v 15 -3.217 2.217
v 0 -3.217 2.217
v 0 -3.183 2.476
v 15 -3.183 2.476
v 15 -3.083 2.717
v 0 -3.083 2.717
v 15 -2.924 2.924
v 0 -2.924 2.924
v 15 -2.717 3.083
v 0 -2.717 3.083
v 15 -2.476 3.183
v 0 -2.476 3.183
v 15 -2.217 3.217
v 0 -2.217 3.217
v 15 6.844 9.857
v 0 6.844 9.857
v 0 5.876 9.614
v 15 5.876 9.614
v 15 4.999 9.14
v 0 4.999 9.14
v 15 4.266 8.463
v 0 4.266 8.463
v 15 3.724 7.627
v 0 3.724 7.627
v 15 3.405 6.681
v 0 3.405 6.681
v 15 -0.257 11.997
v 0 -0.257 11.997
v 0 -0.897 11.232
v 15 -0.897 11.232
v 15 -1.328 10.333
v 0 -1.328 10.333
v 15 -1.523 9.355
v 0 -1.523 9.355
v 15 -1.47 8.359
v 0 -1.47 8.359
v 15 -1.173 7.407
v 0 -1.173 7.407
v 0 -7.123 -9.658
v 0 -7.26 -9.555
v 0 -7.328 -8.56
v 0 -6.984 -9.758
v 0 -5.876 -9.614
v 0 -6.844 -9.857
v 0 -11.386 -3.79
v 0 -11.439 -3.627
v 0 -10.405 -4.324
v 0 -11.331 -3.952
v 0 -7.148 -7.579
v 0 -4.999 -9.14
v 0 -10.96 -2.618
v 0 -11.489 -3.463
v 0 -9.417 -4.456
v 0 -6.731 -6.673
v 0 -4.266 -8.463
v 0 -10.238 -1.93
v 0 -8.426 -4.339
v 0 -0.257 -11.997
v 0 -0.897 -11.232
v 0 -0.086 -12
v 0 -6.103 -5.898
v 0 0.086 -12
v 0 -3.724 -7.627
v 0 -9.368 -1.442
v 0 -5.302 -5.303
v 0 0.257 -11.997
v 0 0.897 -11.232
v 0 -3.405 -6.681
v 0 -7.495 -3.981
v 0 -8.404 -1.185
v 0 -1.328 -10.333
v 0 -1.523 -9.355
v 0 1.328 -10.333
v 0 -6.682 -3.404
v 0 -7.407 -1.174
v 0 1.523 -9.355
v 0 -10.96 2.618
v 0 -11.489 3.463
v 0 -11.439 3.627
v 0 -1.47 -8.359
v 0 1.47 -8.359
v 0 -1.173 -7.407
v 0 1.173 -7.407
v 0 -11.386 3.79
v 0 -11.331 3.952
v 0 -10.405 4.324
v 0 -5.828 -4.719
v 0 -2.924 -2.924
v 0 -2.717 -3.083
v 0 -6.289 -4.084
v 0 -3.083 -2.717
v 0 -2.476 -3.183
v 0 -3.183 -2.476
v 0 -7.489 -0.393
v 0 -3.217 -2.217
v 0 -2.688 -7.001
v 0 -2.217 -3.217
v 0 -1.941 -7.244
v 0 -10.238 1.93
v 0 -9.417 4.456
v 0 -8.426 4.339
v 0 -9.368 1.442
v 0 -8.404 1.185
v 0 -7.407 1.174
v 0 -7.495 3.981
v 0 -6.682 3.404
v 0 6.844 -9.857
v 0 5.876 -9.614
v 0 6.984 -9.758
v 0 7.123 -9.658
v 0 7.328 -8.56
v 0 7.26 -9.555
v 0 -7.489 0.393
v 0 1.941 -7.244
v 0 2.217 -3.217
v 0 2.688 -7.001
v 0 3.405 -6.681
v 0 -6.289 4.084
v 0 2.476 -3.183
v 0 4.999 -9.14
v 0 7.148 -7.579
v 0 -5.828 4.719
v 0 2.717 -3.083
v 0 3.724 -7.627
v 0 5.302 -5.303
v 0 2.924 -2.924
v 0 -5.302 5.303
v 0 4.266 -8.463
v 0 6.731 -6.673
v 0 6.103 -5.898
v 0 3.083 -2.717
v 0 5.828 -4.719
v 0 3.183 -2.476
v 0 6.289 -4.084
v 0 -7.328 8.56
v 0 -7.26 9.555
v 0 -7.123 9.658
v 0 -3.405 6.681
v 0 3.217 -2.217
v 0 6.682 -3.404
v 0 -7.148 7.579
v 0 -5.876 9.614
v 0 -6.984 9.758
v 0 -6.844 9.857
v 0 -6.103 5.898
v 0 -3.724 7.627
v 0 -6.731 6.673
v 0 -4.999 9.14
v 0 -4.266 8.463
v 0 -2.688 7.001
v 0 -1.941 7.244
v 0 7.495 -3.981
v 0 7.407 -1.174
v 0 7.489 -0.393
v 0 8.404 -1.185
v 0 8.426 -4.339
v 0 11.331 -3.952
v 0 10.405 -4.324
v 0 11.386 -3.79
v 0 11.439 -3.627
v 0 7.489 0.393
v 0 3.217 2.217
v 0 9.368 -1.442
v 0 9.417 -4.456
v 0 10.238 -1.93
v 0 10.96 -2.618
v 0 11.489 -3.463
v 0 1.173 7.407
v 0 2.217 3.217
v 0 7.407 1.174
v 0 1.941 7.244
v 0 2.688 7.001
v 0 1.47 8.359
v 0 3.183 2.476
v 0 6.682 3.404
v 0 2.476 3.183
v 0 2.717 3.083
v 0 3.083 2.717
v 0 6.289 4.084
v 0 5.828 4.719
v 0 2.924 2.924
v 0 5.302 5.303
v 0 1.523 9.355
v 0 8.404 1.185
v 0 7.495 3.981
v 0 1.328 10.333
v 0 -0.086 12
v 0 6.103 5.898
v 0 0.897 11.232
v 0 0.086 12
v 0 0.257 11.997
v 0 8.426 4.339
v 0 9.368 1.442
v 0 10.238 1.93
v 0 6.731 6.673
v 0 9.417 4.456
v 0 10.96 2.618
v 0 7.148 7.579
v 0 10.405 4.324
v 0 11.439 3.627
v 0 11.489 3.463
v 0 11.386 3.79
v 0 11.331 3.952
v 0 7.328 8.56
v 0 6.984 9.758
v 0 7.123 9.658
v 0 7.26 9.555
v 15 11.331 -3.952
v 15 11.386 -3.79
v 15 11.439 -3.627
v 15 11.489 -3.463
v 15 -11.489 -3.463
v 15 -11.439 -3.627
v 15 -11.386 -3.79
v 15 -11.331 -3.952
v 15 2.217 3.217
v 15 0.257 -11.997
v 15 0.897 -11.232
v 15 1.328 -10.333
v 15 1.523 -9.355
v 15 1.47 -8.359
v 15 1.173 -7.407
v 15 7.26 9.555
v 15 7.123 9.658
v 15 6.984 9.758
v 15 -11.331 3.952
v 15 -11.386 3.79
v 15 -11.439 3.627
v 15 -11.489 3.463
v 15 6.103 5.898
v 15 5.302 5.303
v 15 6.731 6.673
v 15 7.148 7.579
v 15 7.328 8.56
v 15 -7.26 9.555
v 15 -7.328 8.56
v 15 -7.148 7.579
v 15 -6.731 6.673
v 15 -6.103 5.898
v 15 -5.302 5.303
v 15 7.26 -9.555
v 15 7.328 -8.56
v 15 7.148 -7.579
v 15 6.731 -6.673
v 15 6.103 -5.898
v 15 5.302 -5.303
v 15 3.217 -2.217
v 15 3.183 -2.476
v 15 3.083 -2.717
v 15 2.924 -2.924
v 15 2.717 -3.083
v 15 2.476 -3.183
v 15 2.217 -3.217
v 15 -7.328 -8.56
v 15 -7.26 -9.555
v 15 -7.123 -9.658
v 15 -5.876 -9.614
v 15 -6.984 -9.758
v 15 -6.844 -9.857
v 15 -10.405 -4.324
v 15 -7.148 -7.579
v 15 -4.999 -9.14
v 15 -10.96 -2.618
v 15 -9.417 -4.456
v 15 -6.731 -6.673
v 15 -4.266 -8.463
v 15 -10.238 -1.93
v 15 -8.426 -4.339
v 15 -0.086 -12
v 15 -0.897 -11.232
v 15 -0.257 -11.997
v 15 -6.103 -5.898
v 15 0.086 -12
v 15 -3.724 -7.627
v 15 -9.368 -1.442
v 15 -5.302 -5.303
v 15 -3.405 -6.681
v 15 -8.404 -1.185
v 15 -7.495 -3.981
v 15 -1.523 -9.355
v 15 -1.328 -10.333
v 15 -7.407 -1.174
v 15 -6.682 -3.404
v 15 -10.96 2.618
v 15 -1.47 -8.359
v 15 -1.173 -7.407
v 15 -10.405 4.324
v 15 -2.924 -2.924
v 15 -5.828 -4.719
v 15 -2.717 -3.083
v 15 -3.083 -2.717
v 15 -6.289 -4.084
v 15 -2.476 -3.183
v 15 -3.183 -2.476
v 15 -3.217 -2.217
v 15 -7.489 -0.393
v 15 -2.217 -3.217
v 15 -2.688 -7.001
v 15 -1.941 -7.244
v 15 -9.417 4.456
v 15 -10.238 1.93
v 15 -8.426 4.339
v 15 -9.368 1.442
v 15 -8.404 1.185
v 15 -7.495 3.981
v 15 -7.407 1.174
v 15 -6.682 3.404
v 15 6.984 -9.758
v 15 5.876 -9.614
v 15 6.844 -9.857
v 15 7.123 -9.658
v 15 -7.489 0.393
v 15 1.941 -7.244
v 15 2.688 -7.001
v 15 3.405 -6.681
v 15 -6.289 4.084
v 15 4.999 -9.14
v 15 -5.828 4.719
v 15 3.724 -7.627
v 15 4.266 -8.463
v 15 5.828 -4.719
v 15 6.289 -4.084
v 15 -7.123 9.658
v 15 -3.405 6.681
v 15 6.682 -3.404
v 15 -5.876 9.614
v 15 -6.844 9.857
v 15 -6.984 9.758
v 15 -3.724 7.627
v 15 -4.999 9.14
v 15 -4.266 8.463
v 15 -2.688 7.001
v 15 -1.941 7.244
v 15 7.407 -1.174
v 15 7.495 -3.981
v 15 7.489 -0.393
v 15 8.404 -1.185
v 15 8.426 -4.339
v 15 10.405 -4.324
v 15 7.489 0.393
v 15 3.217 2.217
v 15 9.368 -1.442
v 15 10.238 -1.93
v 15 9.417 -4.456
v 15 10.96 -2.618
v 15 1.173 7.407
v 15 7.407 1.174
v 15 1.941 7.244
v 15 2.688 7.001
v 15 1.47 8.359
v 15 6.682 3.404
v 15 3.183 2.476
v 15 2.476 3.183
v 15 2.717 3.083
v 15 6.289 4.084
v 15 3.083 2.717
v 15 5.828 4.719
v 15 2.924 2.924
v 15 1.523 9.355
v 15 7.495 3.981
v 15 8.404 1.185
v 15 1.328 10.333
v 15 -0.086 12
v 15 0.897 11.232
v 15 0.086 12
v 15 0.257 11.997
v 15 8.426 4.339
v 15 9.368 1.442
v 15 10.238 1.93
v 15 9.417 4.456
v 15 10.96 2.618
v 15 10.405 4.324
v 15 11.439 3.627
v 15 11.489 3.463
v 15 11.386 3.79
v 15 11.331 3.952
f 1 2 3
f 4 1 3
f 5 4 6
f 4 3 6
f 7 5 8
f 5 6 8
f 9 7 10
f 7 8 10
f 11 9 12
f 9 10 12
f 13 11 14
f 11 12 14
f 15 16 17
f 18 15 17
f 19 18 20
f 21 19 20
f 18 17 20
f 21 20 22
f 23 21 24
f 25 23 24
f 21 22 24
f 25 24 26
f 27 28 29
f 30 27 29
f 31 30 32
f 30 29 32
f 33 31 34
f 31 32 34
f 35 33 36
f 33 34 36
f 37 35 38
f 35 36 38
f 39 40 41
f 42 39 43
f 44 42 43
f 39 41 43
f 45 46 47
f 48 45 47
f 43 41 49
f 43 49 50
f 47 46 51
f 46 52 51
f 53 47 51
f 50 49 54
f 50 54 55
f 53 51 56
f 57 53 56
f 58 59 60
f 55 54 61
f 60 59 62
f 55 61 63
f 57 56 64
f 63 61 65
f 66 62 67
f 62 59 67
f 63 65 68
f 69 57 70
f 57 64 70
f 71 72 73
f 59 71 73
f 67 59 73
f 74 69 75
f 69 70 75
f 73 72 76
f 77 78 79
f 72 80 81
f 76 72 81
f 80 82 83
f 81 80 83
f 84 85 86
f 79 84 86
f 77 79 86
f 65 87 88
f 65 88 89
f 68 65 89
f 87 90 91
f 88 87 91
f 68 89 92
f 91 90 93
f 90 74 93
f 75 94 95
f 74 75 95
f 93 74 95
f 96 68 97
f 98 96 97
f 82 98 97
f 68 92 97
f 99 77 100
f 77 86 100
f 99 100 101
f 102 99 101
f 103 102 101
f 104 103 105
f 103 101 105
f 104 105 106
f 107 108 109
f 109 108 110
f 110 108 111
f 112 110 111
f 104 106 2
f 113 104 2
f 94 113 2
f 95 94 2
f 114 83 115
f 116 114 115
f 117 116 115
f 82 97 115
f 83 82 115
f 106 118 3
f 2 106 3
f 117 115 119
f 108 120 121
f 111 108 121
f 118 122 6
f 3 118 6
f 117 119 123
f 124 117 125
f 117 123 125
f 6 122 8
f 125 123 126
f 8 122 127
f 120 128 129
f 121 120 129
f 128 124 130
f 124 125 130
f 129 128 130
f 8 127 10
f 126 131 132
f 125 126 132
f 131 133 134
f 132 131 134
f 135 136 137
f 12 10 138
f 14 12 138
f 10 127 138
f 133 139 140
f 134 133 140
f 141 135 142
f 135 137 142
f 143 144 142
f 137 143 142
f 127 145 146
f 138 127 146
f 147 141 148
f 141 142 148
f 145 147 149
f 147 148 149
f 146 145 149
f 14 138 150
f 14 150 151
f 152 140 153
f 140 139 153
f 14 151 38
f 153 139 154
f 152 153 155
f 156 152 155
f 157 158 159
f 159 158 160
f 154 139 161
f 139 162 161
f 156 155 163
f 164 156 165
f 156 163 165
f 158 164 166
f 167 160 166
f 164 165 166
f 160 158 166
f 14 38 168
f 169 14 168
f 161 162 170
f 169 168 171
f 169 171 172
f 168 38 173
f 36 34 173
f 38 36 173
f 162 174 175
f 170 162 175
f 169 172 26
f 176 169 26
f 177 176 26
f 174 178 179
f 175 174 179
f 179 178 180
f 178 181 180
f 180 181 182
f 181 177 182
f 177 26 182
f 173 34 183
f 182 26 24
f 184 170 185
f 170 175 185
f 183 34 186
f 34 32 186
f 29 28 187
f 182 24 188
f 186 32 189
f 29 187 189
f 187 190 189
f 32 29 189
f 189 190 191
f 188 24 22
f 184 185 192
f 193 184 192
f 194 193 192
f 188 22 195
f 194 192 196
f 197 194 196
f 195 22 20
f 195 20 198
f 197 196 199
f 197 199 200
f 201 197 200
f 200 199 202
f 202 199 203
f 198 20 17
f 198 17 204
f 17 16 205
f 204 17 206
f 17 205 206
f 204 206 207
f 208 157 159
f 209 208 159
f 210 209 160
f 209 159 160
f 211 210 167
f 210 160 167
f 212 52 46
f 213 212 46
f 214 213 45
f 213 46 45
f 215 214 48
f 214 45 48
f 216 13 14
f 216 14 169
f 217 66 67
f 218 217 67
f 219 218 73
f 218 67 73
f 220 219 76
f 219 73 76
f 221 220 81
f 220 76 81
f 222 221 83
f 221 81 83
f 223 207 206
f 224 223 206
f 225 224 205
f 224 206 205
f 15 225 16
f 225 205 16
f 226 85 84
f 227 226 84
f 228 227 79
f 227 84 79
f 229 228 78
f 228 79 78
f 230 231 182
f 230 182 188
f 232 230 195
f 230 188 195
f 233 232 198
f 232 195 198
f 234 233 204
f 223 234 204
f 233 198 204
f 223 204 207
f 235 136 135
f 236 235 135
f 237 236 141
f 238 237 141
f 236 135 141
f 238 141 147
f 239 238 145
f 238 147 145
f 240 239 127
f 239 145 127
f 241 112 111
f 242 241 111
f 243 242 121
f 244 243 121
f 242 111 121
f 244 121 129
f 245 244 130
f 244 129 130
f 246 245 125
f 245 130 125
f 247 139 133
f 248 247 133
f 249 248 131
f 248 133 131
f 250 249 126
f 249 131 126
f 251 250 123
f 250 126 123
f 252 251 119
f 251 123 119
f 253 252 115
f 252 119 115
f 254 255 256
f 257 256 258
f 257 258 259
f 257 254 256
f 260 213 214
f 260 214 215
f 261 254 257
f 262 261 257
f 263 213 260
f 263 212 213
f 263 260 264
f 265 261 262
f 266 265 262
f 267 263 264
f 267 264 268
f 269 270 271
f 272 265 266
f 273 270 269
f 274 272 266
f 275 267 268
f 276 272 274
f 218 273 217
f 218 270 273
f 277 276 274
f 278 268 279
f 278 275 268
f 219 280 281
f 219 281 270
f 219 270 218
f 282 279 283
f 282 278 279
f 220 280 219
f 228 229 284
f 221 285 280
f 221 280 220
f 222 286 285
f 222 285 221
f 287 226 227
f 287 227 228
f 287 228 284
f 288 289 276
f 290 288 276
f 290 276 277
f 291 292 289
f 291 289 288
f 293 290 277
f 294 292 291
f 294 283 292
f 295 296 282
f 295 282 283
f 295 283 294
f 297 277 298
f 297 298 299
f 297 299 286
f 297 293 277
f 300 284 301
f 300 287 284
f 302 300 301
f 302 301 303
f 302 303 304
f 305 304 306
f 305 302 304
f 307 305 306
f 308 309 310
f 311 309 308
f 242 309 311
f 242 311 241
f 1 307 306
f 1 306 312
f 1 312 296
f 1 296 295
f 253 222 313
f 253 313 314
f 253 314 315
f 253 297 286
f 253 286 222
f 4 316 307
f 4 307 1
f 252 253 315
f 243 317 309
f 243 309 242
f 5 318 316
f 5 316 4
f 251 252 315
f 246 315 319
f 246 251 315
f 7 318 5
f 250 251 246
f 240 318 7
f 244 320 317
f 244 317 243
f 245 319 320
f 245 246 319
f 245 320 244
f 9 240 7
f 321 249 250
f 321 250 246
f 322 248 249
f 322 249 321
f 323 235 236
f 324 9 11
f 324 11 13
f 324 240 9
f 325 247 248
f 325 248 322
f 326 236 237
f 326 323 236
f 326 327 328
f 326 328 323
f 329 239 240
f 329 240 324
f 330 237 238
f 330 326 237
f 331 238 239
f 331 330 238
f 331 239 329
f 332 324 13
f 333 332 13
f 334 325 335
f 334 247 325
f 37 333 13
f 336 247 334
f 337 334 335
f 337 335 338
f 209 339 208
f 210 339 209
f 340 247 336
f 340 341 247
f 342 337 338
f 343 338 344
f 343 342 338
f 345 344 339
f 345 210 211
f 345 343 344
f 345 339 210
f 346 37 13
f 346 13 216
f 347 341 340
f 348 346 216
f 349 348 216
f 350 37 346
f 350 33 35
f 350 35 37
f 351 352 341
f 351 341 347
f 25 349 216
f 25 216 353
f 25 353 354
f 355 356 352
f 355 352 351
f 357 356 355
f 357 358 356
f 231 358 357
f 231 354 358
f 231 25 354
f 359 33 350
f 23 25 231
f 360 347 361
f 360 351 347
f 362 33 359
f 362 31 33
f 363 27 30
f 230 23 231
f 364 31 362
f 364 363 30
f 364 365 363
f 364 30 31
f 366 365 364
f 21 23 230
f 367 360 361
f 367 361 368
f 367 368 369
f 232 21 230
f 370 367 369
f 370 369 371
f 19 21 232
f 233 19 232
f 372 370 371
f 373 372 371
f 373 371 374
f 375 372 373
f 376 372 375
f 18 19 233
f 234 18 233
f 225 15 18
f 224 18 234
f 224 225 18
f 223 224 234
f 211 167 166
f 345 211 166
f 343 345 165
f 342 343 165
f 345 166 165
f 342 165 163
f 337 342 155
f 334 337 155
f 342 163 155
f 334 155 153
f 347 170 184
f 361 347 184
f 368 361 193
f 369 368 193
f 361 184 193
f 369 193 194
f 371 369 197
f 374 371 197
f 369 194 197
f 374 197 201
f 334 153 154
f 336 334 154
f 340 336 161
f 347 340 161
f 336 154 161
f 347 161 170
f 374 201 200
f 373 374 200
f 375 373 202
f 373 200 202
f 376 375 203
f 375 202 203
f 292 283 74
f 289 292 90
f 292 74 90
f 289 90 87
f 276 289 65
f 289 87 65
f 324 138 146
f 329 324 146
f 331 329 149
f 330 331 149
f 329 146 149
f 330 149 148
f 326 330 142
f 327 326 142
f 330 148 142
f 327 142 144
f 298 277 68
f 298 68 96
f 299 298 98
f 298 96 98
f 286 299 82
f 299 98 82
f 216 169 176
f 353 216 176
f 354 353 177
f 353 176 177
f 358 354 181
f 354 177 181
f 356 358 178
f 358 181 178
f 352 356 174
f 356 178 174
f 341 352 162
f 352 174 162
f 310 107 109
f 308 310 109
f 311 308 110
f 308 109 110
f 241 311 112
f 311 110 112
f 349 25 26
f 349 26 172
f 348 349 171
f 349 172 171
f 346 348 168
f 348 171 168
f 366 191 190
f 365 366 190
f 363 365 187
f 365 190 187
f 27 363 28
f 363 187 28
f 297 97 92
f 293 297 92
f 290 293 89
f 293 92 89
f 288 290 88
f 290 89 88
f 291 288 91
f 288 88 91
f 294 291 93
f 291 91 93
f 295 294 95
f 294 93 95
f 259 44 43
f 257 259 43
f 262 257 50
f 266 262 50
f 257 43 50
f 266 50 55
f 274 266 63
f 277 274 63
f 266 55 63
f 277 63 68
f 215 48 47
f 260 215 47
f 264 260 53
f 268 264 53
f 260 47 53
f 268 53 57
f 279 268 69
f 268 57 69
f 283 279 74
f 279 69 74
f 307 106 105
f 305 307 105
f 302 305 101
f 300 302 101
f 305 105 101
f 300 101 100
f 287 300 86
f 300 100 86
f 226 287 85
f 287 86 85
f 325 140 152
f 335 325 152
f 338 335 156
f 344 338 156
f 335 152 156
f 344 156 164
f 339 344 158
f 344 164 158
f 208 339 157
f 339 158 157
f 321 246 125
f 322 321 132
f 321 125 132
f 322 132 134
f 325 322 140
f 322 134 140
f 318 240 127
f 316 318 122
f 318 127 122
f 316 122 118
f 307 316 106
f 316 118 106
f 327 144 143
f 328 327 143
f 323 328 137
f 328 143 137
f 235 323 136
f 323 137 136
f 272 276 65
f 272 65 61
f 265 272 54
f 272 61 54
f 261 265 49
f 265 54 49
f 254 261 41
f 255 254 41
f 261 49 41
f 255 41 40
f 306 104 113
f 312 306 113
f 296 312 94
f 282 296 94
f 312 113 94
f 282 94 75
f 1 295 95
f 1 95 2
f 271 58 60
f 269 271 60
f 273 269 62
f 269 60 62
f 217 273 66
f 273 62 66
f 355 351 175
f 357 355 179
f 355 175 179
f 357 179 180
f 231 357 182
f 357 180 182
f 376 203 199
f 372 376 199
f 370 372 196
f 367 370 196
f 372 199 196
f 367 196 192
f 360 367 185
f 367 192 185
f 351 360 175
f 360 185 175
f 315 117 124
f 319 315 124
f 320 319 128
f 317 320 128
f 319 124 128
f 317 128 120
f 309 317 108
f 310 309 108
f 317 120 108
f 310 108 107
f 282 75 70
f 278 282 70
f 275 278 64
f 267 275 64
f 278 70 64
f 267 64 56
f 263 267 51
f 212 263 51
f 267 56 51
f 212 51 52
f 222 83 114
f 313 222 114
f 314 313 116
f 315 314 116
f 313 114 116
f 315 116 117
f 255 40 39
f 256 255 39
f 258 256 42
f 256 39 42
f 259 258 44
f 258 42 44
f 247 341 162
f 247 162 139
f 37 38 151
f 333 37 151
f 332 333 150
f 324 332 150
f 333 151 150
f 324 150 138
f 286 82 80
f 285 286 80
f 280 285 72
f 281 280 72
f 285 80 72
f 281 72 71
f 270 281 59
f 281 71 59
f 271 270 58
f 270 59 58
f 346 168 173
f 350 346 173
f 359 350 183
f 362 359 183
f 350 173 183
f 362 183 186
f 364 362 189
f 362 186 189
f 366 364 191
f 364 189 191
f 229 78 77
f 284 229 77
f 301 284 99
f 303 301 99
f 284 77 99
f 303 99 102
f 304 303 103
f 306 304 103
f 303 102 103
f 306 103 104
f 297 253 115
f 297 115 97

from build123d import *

# Parameters (mm, degrees)
SPUR_GEAR_GB_BORE_OUTLINE_R = 1
SPUR_GEAR_GB_BORE_DEPTH     = 15
CUT_EXTRUDE_3_DEPTH         = 15


# Read off the part's stored shape, not the designer's step: <spur gear_gb>-<Bore>
with BuildPart() as part:
    # <spur gear_gb>-<Bore> outline → <spur gear_gb>-<Bore> (new body)
    with BuildSketch(Plane.YZ):
        with BuildLine():
            ThreePointArc((-0.256880001, -11.997250213), (0, -12), (0.256880001, -11.997250213))
            ThreePointArc((0.256880001, -11.997250213), (1.456299749, -9.849931218), (1.172541409, -7.406763642))
            ThreePointArc((1.172541409, -7.406763642), (2.317318441, -7.131972816), (3.404980509, -6.681400207))
            ThreePointArc((3.404980509, -6.681400207), (4.61147306, -8.824753264), (6.843986457, -9.856969584))
            ThreePointArc((6.843986457, -9.856969584), (7.053423027, -9.708203933), (7.259627029, -9.554989032))
            ThreePointArc((7.259627029, -9.554989032), (6.967815552, -7.112770233), (5.302192362, -5.302995112))
            ThreePointArc((5.302192362, -5.302995112), (6.066818441, -4.407801607), (6.681915604, -3.403968986))
            ThreePointArc((6.681915604, -3.403968986), (8.917819898, -4.428819506), (11.330682707, -3.9516616))
            ThreePointArc((11.330682707, -3.9516616), (11.412678196, -3.708203933), (11.489443278, -3.463046803))
            ThreePointArc((11.489443278, -3.463046803), (9.817862641, -1.658772773), (7.406586048, -1.173662691))
            ThreePointArc((7.406586048, -1.173662691), (7.499, 0), (7.406586048, 1.173662691))
            ThreePointArc((7.406586048, 1.173662691), (9.817862641, 1.658772773), (11.489443278, 3.463046803))
            ThreePointArc((11.489443278, 3.463046803), (11.412678196, 3.708203933), (11.330682707, 3.9516616))
            ThreePointArc((11.330682707, 3.9516616), (8.917819898, 4.428819506), (6.681915604, 3.403968986))
            ThreePointArc((6.681915604, 3.403968986), (6.066818441, 4.407801607), (5.302192362, 5.302995112))
            ThreePointArc((5.302192362, 5.302995112), (6.967815552, 7.112770233), (7.259627029, 9.554989032))
            ThreePointArc((7.259627029, 9.554989032), (7.053423027, 9.708203933), (6.843986457, 9.856969584))
            ThreePointArc((6.843986457, 9.856969584), (4.61147306, 8.824753264), (3.404980509, 6.681400207))
            ThreePointArc((3.404980509, 6.681400207), (2.317318441, 7.131972816), (1.172541409, 7.406763642))
            ThreePointArc((1.172541409, 7.406763642), (1.456299749, 9.849931218), (0.256880001, 11.997250213))
            ThreePointArc((0.256880001, 11.997250213), (0, 12), (-0.256880001, 11.997250213))
            ThreePointArc((-0.256880001, 11.997250213), (-1.456299749, 9.849931218), (-1.172541409, 7.406763642))
            ThreePointArc((-1.172541409, 7.406763642), (-2.317318441, 7.131972816), (-3.404980509, 6.681400207))
            ThreePointArc((-3.404980509, 6.681400207), (-4.61147306, 8.824753264), (-6.843986457, 9.856969584))
            ThreePointArc((-6.843986457, 9.856969584), (-7.053423027, 9.708203933), (-7.259627029, 9.554989032))
            ThreePointArc((-7.259627029, 9.554989032), (-6.967815552, 7.112770233), (-5.302192362, 5.302995112))
            ThreePointArc((-5.302192362, 5.302995112), (-6.066818441, 4.407801607), (-6.681915604, 3.403968986))
            ThreePointArc((-6.681915604, 3.403968986), (-8.917819898, 4.428819506), (-11.330682707, 3.9516616))
            ThreePointArc((-11.330682707, 3.9516616), (-11.412678196, 3.708203933), (-11.489443278, 3.463046803))
            ThreePointArc((-11.489443278, 3.463046803), (-9.817862641, 1.658772773), (-7.406586048, 1.173662691))
            ThreePointArc((-7.406586048, 1.173662691), (-7.499, 0), (-7.406586048, -1.173662691))
            ThreePointArc((-7.406586048, -1.173662691), (-9.817862641, -1.658772773), (-11.489443278, -3.463046803))
            ThreePointArc((-11.489443278, -3.463046803), (-11.412678196, -3.708203933), (-11.330682707, -3.9516616))
            ThreePointArc((-11.330682707, -3.9516616), (-8.917819898, -4.428819506), (-6.681915604, -3.403968986))
            ThreePointArc((-6.681915604, -3.403968986), (-6.066818441, -4.407801607), (-5.302192362, -5.302995112))
            ThreePointArc((-5.302192362, -5.302995112), (-6.967815552, -7.112770233), (-7.259627029, -9.554989032))
            ThreePointArc((-7.259627029, -9.554989032), (-7.053423027, -9.708203933), (-6.843986457, -9.856969584))
            ThreePointArc((-6.843986457, -9.856969584), (-4.61147306, -8.824753264), (-3.404980509, -6.681400207))
            ThreePointArc((-3.404980509, -6.681400207), (-2.317318441, -7.131972816), (-1.172541409, -7.406763642))
            ThreePointArc((-1.172541409, -7.406763642), (-1.456299749, -9.849931218), (-0.256880001, -11.997250213))
        make_face()
        Circle(SPUR_GEAR_GB_BORE_OUTLINE_R, mode=Mode.SUBTRACT)
    extrude(amount=SPUR_GEAR_GB_BORE_DEPTH)

    # 草图8 → 切除-拉伸3 (cut)
    with BuildSketch(Plane(origin=(0, 0, 0), x_dir=(0, 0, -1), z_dir=(1, 0, 0))):
        with BuildLine():
            Line((-2.217335854, 3.217335854), (2.217335854, 3.217335854))
            ThreePointArc((2.217335854, 3.217335854), (2.924442636, 2.924442636), (3.217335854, 2.217335854))
            Line((3.217335854, 2.217335854), (3.217335854, -2.217335854))
            ThreePointArc((3.217335854, -2.217335854), (2.924442636, -2.924442636), (2.217335854, -3.217335854))
            Line((2.217335854, -3.217335854), (-2.217335854, -3.217335854))
            ThreePointArc((-2.217335854, -3.217335854), (-2.924442636, -2.924442636), (-3.217335854, -2.217335854))
            Line((-3.217335854, -2.217335854), (-3.217335854, 2.217335854))
            ThreePointArc((-3.217335854, 2.217335854), (-2.924442636, 2.924442636), (-2.217335854, 3.217335854))
        make_face()
    extrude(amount=CUT_EXTRUDE_3_DEPTH, mode=Mode.SUBTRACT)


solid = part.part
